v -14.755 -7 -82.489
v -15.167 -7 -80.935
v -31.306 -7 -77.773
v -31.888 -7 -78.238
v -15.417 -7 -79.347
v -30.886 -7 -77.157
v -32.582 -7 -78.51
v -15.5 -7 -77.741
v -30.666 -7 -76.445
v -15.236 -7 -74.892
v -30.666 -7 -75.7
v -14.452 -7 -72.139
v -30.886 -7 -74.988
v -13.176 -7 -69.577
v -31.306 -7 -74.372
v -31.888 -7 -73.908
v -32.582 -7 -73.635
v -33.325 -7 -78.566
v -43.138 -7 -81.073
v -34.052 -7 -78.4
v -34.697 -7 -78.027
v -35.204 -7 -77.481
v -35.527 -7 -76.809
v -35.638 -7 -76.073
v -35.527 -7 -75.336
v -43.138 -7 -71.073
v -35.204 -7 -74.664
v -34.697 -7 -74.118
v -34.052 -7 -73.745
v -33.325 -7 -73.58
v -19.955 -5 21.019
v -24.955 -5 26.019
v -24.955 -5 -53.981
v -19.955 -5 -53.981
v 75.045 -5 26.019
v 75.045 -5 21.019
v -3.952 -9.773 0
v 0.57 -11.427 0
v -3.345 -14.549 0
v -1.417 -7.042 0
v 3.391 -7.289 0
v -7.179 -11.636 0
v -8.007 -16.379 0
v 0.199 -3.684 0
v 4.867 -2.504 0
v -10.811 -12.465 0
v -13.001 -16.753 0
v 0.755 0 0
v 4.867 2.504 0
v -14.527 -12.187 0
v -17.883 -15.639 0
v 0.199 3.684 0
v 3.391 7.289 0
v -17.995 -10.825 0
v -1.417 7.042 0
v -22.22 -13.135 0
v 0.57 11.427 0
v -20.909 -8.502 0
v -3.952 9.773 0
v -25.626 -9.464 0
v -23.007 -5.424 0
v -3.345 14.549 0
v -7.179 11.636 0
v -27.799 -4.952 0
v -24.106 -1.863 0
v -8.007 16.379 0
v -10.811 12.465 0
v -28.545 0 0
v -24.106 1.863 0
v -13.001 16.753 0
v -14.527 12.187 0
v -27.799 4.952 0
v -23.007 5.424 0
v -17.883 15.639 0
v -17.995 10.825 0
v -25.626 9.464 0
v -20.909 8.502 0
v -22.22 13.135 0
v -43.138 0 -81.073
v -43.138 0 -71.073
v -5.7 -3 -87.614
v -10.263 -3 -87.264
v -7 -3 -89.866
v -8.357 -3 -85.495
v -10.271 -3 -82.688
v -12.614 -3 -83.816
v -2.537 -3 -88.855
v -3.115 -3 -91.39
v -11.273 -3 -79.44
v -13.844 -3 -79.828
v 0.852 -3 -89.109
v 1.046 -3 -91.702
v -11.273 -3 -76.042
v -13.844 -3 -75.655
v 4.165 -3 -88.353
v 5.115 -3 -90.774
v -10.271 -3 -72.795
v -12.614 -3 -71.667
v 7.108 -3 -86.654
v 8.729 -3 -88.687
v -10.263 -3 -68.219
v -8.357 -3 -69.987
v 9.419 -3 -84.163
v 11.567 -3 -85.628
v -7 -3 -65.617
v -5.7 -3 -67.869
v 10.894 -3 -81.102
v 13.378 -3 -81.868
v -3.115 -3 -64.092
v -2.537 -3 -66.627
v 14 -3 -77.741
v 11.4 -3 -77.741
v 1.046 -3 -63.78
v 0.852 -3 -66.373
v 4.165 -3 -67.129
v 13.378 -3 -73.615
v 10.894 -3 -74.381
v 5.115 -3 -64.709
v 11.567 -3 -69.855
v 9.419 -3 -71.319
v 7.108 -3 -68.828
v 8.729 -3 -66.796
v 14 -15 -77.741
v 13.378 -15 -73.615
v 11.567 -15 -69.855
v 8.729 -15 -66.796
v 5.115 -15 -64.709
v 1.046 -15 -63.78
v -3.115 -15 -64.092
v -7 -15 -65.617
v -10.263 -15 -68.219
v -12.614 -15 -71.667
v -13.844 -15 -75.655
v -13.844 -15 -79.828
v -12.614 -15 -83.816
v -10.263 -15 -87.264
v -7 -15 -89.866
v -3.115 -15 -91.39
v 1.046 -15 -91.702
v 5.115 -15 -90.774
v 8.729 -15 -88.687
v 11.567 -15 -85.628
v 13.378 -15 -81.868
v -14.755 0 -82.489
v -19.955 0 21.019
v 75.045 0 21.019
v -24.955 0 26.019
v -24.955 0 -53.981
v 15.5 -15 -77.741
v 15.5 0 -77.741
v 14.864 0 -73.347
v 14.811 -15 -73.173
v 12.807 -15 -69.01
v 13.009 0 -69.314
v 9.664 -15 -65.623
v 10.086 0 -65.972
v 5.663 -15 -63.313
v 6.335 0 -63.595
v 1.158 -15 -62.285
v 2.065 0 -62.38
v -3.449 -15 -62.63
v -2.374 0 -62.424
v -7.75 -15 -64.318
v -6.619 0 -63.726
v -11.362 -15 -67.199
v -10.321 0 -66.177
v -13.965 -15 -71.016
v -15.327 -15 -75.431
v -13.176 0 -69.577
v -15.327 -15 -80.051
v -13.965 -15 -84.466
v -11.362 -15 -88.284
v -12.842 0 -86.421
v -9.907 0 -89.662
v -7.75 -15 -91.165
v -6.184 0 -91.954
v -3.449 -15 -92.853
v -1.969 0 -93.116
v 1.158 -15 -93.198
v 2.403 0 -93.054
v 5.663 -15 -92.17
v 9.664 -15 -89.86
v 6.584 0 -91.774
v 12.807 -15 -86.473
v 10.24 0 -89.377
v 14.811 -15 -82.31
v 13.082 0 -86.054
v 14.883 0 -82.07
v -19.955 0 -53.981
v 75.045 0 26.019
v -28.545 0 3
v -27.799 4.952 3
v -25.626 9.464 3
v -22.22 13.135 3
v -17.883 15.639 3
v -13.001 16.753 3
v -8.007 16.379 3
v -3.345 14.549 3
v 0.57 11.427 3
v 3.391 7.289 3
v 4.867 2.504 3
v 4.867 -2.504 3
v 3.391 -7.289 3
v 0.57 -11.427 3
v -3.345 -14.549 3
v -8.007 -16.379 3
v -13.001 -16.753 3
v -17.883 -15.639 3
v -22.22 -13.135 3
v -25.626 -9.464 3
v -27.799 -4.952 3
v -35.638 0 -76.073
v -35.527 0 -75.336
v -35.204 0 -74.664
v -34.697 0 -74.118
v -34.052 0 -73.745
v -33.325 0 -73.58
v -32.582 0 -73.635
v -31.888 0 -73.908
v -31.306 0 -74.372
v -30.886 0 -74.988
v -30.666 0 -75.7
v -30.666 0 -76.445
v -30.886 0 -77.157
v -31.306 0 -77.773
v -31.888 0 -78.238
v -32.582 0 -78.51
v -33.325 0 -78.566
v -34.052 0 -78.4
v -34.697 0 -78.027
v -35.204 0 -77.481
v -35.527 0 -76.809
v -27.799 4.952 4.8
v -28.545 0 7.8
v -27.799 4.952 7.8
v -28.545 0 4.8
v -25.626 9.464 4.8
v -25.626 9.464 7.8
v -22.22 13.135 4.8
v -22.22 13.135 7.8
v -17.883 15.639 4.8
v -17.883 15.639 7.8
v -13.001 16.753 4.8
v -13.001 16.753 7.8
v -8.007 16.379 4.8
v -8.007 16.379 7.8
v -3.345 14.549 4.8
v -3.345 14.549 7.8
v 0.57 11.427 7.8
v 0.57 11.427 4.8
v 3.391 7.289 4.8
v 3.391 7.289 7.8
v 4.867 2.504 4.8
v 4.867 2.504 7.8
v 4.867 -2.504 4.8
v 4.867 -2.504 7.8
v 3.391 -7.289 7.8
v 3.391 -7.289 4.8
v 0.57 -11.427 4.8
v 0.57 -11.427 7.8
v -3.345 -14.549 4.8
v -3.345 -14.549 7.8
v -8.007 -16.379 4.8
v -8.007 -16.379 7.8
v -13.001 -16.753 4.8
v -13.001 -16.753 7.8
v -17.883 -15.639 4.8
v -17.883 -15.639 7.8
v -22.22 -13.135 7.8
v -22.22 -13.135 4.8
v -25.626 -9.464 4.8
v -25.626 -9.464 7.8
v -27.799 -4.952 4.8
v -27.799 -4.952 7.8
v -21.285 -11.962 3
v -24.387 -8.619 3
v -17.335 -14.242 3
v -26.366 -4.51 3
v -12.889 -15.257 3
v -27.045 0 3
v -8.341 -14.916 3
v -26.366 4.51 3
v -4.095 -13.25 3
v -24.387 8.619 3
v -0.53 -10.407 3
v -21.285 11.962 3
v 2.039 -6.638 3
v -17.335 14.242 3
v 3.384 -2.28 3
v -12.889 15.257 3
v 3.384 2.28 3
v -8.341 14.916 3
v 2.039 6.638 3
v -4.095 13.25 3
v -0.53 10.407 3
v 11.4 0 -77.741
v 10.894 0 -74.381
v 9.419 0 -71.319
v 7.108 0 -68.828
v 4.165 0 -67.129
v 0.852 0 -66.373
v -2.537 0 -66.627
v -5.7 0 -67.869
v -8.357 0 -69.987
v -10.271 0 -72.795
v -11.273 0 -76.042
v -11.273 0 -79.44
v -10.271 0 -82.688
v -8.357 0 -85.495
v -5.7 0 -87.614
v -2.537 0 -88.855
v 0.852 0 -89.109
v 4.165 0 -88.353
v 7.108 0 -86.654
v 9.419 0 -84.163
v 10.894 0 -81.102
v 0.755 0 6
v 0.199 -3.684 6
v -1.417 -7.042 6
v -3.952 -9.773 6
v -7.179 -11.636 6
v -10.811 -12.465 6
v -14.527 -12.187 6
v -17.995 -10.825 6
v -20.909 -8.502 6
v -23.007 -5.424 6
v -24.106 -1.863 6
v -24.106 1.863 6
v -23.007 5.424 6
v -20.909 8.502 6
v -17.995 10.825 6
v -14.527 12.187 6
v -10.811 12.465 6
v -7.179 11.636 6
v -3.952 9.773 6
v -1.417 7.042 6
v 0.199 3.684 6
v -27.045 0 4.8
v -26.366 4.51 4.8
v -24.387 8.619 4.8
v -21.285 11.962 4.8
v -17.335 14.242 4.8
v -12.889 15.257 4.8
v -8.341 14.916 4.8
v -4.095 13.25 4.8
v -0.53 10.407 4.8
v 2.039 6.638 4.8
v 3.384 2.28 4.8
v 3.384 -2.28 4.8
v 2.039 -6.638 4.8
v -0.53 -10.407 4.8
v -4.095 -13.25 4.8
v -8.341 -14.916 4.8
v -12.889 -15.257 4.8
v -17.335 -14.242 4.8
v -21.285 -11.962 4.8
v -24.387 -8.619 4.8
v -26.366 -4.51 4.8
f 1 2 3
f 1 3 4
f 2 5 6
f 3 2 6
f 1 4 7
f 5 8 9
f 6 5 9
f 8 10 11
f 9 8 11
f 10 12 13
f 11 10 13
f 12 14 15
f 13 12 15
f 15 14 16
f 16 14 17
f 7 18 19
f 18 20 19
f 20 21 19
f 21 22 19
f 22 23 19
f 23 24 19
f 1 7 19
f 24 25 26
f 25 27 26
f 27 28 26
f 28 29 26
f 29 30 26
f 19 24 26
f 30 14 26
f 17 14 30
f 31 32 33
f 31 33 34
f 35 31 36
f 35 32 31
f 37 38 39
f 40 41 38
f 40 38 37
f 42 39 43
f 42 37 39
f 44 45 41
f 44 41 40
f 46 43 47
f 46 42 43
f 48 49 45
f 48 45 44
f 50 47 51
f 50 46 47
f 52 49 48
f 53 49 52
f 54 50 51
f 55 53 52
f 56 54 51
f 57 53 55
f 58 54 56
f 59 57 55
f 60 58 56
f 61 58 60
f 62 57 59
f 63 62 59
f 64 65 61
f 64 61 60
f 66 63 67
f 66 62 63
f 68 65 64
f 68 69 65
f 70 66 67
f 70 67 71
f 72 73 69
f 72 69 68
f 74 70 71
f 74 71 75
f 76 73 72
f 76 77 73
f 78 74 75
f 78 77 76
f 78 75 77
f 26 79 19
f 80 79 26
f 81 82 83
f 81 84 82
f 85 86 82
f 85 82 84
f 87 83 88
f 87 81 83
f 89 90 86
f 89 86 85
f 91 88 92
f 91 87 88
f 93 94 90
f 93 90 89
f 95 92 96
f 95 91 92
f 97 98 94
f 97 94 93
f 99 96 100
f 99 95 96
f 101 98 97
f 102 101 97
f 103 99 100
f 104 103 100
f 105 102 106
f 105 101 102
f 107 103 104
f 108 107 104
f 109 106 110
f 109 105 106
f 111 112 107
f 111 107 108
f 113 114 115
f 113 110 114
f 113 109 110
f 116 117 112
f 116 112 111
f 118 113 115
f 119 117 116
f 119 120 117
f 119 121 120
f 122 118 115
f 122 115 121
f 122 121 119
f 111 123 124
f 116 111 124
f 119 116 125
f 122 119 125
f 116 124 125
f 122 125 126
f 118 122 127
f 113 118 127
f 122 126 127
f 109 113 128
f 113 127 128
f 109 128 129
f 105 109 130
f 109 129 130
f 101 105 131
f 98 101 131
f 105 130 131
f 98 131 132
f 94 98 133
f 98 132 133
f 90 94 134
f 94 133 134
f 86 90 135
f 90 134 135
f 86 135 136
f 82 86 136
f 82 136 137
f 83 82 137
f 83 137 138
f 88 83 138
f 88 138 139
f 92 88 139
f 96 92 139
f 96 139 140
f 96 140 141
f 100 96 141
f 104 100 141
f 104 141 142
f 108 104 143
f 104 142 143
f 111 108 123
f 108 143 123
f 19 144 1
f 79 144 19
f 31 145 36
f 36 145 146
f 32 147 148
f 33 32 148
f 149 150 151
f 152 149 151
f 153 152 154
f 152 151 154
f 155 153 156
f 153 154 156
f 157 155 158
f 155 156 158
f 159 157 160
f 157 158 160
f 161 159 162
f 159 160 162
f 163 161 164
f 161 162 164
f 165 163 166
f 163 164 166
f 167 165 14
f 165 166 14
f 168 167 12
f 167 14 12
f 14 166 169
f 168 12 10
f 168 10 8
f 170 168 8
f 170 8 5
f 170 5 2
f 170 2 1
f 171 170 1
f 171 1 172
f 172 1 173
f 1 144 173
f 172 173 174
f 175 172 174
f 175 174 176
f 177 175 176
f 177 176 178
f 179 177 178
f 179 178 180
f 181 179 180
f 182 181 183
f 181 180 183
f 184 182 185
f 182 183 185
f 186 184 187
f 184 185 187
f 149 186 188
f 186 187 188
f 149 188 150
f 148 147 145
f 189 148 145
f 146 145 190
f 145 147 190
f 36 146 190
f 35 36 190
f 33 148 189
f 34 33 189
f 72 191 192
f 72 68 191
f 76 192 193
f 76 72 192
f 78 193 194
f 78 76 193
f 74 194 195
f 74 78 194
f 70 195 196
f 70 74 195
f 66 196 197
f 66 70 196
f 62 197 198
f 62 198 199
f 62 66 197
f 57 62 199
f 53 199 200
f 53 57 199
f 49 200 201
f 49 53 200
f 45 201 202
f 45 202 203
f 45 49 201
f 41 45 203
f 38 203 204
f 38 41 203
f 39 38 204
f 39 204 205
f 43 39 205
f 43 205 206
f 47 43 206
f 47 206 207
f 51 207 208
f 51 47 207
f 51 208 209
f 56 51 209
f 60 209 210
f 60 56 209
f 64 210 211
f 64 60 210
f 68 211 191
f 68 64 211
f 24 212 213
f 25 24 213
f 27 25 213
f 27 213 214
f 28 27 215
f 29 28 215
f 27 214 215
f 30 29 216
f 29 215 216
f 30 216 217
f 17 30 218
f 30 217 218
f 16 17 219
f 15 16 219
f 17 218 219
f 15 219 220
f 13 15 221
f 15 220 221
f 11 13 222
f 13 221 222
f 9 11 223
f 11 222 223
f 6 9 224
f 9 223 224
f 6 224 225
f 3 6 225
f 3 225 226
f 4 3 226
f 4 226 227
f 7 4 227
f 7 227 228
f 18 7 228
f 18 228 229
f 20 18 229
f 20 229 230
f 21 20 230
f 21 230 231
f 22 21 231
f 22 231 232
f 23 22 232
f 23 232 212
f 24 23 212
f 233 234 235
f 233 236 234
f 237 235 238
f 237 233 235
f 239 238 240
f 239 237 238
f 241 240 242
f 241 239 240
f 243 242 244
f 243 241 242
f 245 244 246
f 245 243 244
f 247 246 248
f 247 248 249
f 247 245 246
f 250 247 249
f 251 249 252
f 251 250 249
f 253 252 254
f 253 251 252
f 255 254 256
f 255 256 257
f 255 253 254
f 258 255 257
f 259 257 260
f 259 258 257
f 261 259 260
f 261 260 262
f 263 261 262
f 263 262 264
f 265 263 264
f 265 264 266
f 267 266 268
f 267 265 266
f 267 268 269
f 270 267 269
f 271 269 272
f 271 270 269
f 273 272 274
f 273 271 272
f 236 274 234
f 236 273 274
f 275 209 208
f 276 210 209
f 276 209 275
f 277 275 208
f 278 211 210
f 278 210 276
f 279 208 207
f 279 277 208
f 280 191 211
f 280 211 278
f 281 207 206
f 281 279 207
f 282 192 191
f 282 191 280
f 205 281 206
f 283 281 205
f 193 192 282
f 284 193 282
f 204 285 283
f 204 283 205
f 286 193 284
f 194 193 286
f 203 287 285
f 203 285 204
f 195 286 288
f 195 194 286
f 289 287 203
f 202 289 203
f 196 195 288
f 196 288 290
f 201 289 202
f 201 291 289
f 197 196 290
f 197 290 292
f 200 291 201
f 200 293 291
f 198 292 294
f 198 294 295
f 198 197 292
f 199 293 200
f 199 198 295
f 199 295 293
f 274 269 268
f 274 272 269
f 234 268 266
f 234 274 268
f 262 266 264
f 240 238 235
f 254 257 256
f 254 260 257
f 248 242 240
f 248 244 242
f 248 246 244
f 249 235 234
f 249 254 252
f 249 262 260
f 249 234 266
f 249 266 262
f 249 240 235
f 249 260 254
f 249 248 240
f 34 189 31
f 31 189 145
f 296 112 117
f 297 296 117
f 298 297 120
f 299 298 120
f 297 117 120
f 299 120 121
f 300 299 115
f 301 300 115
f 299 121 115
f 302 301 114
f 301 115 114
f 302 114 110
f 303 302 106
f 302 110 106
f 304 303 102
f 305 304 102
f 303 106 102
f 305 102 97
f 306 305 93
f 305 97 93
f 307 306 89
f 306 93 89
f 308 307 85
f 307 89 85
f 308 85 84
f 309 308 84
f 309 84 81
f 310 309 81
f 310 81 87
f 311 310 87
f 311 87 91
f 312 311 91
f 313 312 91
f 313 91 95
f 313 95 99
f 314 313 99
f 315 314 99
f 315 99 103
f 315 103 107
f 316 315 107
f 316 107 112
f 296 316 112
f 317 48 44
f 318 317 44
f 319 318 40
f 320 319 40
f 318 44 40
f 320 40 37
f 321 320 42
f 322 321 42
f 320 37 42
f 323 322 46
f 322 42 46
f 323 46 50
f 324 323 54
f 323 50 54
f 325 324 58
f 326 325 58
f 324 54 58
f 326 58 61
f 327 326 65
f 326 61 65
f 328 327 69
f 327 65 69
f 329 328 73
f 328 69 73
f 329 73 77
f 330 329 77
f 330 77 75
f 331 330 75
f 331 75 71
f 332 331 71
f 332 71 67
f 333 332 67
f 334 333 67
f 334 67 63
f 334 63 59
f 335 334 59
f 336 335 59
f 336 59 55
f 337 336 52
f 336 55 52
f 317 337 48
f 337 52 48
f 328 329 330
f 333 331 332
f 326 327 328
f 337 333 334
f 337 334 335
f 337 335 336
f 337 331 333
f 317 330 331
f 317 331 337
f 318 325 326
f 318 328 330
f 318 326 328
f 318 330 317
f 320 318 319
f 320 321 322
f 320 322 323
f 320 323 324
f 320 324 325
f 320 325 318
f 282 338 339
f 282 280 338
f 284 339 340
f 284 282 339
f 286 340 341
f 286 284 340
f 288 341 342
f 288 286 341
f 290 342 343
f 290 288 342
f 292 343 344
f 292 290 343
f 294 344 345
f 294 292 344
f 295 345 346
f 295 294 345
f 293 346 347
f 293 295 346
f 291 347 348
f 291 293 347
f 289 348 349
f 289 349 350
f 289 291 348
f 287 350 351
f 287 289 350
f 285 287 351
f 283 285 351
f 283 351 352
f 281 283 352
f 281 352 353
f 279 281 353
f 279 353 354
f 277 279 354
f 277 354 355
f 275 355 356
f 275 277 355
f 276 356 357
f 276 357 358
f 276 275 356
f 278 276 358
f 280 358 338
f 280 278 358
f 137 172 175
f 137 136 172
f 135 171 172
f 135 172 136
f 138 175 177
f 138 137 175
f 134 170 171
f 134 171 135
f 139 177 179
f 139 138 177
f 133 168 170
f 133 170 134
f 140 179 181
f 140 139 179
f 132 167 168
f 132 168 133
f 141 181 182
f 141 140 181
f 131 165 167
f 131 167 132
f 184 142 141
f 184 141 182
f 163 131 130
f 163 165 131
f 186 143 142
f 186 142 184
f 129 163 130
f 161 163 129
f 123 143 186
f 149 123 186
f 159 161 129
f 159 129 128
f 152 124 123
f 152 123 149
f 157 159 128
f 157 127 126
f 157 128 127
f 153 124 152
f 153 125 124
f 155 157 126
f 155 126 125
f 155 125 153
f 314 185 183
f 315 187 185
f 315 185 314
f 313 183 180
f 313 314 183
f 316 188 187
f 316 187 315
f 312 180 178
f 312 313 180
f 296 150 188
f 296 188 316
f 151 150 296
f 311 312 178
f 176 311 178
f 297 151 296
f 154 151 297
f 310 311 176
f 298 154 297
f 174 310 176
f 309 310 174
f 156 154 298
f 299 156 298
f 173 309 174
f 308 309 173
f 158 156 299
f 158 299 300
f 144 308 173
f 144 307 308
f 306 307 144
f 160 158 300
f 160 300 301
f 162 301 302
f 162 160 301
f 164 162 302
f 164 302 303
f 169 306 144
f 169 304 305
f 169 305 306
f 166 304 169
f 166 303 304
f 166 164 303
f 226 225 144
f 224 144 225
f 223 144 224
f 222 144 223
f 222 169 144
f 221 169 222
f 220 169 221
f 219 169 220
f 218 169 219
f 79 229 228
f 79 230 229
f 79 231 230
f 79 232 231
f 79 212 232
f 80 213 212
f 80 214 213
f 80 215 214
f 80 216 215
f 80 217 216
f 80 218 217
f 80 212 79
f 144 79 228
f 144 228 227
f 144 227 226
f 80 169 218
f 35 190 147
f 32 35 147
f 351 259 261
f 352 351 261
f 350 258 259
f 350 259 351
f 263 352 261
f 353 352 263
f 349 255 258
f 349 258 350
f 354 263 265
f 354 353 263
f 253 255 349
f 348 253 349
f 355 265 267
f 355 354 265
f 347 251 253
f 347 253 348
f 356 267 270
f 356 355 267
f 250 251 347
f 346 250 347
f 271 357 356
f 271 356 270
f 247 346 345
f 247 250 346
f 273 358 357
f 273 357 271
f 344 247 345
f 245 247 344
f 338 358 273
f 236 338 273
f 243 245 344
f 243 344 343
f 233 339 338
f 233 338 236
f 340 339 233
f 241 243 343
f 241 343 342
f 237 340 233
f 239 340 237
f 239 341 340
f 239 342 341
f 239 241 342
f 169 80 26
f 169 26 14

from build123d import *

# Parameters (mm, degrees)
F2_R      = 12.5
F3_DEPTH  = 6
F4_R      = 15.5
F5_DEPTH  = 15
F6_R      = 14
F7_DEPTH  = 12
F9_DEPTH  = 7
F10_R     = 11.4
F11_DEPTH = 25
F13_D     = 5
F14_W     = 5
F14_H     = 75
F15_DEPTH = 5


with BuildPart() as f1:
    # F0 (on Front) → F1 (revolve)
    with BuildSketch(Plane.XZ):
        Polygon((-28.545385, 3), (-28.545385, 0), (-11.745385, 0), (-11.745385, 7.8), (-28.545385, 7.8), (-28.545385, 4.8), (-27.045385, 4.8), (-27.045385, 3), align=None)
    revolve(axis=Axis((-11.745385, 0, 3.9), (0, 0, -1)))

    # F2 (on face) → F3 (cut)
    with BuildSketch(Plane(origin=(0, 0, 0), x_dir=(1, 0, 0), z_dir=(0, 0, -1))):
        with Locations((-11.745385, 0)):
            Circle(F2_R)
    extrude(amount=-F3_DEPTH, mode=Mode.SUBTRACT)


with BuildPart() as f5:
    # F4 (on Front) → F5 (new body)
    with BuildSketch(Plane.XZ):
        with Locations((0, -77.741298)):
            Circle(F4_R)
    extrude(amount=F5_DEPTH)

    # F6 (on face) → F7 (cut)
    with BuildSketch(Plane.XZ.offset(15)):
        with Locations((0, -77.741298)):
            Circle(F6_R)
    extrude(amount=-F7_DEPTH, mode=Mode.SUBTRACT)

    # F8 (on face) → F9 (join)
    with BuildSketch(Plane(origin=(0, 0, 0), x_dir=(-1, 0, 0), z_dir=(0, 1, 0))):
        with BuildLine():
            Line((43.138498, -71.072604), (13.17578, -69.577425))
            ThreePointArc((13.17578, -69.577425), (14.657159, -72.699703), (15.409914, -76.072604))
            Line((15.409914, -76.072604), (43.138498, -76.072604))
            Line((43.138498, -76.072604), (43.138498, -71.072604))
        make_face()
        with BuildLine():
            Line((43.138498, -76.072604), (15.409914, -76.072604))
            ThreePointArc((15.409914, -76.072604), (15.477462, -76.905736), (15.5, -77.741298))
            ThreePointArc((15.5, -77.741298), (15.312613, -80.144187), (14.754983, -82.488978))
            Line((14.754983, -82.488978), (43.138498, -81.072604))
            Line((43.138498, -81.072604), (43.138498, -76.072604))
        make_face()
    extrude(amount=-F9_DEPTH)

    # F10 (on face) → F11 (cut)
    with BuildSketch(Plane.XZ.offset(3)):
        with Locations((0, -77.741298)):
            Circle(F10_R)
    extrude(amount=-F11_DEPTH, mode=Mode.SUBTRACT)

    # F13 (through all)
    with Locations(Plane.XZ.offset(7)):
        with Locations((-33.138498, -76.072604)):
            Hole(F13_D / 2)


with BuildPart() as f15:
    # F14 (on Front) → F15 (new body)
    with BuildSketch(Plane.XZ):
        Polygon((75.045152, 26.018666), (-24.954848, 26.018666), (-24.954848, 21.018666), (-19.954848, 21.018666), (75.045152, 21.018666), align=None)
        with Locations((-22.454848, -16.481334)):
            Rectangle(F14_W, F14_H)
    extrude(amount=F15_DEPTH)


solid = Compound([f1.part, f5.part, f15.part])
